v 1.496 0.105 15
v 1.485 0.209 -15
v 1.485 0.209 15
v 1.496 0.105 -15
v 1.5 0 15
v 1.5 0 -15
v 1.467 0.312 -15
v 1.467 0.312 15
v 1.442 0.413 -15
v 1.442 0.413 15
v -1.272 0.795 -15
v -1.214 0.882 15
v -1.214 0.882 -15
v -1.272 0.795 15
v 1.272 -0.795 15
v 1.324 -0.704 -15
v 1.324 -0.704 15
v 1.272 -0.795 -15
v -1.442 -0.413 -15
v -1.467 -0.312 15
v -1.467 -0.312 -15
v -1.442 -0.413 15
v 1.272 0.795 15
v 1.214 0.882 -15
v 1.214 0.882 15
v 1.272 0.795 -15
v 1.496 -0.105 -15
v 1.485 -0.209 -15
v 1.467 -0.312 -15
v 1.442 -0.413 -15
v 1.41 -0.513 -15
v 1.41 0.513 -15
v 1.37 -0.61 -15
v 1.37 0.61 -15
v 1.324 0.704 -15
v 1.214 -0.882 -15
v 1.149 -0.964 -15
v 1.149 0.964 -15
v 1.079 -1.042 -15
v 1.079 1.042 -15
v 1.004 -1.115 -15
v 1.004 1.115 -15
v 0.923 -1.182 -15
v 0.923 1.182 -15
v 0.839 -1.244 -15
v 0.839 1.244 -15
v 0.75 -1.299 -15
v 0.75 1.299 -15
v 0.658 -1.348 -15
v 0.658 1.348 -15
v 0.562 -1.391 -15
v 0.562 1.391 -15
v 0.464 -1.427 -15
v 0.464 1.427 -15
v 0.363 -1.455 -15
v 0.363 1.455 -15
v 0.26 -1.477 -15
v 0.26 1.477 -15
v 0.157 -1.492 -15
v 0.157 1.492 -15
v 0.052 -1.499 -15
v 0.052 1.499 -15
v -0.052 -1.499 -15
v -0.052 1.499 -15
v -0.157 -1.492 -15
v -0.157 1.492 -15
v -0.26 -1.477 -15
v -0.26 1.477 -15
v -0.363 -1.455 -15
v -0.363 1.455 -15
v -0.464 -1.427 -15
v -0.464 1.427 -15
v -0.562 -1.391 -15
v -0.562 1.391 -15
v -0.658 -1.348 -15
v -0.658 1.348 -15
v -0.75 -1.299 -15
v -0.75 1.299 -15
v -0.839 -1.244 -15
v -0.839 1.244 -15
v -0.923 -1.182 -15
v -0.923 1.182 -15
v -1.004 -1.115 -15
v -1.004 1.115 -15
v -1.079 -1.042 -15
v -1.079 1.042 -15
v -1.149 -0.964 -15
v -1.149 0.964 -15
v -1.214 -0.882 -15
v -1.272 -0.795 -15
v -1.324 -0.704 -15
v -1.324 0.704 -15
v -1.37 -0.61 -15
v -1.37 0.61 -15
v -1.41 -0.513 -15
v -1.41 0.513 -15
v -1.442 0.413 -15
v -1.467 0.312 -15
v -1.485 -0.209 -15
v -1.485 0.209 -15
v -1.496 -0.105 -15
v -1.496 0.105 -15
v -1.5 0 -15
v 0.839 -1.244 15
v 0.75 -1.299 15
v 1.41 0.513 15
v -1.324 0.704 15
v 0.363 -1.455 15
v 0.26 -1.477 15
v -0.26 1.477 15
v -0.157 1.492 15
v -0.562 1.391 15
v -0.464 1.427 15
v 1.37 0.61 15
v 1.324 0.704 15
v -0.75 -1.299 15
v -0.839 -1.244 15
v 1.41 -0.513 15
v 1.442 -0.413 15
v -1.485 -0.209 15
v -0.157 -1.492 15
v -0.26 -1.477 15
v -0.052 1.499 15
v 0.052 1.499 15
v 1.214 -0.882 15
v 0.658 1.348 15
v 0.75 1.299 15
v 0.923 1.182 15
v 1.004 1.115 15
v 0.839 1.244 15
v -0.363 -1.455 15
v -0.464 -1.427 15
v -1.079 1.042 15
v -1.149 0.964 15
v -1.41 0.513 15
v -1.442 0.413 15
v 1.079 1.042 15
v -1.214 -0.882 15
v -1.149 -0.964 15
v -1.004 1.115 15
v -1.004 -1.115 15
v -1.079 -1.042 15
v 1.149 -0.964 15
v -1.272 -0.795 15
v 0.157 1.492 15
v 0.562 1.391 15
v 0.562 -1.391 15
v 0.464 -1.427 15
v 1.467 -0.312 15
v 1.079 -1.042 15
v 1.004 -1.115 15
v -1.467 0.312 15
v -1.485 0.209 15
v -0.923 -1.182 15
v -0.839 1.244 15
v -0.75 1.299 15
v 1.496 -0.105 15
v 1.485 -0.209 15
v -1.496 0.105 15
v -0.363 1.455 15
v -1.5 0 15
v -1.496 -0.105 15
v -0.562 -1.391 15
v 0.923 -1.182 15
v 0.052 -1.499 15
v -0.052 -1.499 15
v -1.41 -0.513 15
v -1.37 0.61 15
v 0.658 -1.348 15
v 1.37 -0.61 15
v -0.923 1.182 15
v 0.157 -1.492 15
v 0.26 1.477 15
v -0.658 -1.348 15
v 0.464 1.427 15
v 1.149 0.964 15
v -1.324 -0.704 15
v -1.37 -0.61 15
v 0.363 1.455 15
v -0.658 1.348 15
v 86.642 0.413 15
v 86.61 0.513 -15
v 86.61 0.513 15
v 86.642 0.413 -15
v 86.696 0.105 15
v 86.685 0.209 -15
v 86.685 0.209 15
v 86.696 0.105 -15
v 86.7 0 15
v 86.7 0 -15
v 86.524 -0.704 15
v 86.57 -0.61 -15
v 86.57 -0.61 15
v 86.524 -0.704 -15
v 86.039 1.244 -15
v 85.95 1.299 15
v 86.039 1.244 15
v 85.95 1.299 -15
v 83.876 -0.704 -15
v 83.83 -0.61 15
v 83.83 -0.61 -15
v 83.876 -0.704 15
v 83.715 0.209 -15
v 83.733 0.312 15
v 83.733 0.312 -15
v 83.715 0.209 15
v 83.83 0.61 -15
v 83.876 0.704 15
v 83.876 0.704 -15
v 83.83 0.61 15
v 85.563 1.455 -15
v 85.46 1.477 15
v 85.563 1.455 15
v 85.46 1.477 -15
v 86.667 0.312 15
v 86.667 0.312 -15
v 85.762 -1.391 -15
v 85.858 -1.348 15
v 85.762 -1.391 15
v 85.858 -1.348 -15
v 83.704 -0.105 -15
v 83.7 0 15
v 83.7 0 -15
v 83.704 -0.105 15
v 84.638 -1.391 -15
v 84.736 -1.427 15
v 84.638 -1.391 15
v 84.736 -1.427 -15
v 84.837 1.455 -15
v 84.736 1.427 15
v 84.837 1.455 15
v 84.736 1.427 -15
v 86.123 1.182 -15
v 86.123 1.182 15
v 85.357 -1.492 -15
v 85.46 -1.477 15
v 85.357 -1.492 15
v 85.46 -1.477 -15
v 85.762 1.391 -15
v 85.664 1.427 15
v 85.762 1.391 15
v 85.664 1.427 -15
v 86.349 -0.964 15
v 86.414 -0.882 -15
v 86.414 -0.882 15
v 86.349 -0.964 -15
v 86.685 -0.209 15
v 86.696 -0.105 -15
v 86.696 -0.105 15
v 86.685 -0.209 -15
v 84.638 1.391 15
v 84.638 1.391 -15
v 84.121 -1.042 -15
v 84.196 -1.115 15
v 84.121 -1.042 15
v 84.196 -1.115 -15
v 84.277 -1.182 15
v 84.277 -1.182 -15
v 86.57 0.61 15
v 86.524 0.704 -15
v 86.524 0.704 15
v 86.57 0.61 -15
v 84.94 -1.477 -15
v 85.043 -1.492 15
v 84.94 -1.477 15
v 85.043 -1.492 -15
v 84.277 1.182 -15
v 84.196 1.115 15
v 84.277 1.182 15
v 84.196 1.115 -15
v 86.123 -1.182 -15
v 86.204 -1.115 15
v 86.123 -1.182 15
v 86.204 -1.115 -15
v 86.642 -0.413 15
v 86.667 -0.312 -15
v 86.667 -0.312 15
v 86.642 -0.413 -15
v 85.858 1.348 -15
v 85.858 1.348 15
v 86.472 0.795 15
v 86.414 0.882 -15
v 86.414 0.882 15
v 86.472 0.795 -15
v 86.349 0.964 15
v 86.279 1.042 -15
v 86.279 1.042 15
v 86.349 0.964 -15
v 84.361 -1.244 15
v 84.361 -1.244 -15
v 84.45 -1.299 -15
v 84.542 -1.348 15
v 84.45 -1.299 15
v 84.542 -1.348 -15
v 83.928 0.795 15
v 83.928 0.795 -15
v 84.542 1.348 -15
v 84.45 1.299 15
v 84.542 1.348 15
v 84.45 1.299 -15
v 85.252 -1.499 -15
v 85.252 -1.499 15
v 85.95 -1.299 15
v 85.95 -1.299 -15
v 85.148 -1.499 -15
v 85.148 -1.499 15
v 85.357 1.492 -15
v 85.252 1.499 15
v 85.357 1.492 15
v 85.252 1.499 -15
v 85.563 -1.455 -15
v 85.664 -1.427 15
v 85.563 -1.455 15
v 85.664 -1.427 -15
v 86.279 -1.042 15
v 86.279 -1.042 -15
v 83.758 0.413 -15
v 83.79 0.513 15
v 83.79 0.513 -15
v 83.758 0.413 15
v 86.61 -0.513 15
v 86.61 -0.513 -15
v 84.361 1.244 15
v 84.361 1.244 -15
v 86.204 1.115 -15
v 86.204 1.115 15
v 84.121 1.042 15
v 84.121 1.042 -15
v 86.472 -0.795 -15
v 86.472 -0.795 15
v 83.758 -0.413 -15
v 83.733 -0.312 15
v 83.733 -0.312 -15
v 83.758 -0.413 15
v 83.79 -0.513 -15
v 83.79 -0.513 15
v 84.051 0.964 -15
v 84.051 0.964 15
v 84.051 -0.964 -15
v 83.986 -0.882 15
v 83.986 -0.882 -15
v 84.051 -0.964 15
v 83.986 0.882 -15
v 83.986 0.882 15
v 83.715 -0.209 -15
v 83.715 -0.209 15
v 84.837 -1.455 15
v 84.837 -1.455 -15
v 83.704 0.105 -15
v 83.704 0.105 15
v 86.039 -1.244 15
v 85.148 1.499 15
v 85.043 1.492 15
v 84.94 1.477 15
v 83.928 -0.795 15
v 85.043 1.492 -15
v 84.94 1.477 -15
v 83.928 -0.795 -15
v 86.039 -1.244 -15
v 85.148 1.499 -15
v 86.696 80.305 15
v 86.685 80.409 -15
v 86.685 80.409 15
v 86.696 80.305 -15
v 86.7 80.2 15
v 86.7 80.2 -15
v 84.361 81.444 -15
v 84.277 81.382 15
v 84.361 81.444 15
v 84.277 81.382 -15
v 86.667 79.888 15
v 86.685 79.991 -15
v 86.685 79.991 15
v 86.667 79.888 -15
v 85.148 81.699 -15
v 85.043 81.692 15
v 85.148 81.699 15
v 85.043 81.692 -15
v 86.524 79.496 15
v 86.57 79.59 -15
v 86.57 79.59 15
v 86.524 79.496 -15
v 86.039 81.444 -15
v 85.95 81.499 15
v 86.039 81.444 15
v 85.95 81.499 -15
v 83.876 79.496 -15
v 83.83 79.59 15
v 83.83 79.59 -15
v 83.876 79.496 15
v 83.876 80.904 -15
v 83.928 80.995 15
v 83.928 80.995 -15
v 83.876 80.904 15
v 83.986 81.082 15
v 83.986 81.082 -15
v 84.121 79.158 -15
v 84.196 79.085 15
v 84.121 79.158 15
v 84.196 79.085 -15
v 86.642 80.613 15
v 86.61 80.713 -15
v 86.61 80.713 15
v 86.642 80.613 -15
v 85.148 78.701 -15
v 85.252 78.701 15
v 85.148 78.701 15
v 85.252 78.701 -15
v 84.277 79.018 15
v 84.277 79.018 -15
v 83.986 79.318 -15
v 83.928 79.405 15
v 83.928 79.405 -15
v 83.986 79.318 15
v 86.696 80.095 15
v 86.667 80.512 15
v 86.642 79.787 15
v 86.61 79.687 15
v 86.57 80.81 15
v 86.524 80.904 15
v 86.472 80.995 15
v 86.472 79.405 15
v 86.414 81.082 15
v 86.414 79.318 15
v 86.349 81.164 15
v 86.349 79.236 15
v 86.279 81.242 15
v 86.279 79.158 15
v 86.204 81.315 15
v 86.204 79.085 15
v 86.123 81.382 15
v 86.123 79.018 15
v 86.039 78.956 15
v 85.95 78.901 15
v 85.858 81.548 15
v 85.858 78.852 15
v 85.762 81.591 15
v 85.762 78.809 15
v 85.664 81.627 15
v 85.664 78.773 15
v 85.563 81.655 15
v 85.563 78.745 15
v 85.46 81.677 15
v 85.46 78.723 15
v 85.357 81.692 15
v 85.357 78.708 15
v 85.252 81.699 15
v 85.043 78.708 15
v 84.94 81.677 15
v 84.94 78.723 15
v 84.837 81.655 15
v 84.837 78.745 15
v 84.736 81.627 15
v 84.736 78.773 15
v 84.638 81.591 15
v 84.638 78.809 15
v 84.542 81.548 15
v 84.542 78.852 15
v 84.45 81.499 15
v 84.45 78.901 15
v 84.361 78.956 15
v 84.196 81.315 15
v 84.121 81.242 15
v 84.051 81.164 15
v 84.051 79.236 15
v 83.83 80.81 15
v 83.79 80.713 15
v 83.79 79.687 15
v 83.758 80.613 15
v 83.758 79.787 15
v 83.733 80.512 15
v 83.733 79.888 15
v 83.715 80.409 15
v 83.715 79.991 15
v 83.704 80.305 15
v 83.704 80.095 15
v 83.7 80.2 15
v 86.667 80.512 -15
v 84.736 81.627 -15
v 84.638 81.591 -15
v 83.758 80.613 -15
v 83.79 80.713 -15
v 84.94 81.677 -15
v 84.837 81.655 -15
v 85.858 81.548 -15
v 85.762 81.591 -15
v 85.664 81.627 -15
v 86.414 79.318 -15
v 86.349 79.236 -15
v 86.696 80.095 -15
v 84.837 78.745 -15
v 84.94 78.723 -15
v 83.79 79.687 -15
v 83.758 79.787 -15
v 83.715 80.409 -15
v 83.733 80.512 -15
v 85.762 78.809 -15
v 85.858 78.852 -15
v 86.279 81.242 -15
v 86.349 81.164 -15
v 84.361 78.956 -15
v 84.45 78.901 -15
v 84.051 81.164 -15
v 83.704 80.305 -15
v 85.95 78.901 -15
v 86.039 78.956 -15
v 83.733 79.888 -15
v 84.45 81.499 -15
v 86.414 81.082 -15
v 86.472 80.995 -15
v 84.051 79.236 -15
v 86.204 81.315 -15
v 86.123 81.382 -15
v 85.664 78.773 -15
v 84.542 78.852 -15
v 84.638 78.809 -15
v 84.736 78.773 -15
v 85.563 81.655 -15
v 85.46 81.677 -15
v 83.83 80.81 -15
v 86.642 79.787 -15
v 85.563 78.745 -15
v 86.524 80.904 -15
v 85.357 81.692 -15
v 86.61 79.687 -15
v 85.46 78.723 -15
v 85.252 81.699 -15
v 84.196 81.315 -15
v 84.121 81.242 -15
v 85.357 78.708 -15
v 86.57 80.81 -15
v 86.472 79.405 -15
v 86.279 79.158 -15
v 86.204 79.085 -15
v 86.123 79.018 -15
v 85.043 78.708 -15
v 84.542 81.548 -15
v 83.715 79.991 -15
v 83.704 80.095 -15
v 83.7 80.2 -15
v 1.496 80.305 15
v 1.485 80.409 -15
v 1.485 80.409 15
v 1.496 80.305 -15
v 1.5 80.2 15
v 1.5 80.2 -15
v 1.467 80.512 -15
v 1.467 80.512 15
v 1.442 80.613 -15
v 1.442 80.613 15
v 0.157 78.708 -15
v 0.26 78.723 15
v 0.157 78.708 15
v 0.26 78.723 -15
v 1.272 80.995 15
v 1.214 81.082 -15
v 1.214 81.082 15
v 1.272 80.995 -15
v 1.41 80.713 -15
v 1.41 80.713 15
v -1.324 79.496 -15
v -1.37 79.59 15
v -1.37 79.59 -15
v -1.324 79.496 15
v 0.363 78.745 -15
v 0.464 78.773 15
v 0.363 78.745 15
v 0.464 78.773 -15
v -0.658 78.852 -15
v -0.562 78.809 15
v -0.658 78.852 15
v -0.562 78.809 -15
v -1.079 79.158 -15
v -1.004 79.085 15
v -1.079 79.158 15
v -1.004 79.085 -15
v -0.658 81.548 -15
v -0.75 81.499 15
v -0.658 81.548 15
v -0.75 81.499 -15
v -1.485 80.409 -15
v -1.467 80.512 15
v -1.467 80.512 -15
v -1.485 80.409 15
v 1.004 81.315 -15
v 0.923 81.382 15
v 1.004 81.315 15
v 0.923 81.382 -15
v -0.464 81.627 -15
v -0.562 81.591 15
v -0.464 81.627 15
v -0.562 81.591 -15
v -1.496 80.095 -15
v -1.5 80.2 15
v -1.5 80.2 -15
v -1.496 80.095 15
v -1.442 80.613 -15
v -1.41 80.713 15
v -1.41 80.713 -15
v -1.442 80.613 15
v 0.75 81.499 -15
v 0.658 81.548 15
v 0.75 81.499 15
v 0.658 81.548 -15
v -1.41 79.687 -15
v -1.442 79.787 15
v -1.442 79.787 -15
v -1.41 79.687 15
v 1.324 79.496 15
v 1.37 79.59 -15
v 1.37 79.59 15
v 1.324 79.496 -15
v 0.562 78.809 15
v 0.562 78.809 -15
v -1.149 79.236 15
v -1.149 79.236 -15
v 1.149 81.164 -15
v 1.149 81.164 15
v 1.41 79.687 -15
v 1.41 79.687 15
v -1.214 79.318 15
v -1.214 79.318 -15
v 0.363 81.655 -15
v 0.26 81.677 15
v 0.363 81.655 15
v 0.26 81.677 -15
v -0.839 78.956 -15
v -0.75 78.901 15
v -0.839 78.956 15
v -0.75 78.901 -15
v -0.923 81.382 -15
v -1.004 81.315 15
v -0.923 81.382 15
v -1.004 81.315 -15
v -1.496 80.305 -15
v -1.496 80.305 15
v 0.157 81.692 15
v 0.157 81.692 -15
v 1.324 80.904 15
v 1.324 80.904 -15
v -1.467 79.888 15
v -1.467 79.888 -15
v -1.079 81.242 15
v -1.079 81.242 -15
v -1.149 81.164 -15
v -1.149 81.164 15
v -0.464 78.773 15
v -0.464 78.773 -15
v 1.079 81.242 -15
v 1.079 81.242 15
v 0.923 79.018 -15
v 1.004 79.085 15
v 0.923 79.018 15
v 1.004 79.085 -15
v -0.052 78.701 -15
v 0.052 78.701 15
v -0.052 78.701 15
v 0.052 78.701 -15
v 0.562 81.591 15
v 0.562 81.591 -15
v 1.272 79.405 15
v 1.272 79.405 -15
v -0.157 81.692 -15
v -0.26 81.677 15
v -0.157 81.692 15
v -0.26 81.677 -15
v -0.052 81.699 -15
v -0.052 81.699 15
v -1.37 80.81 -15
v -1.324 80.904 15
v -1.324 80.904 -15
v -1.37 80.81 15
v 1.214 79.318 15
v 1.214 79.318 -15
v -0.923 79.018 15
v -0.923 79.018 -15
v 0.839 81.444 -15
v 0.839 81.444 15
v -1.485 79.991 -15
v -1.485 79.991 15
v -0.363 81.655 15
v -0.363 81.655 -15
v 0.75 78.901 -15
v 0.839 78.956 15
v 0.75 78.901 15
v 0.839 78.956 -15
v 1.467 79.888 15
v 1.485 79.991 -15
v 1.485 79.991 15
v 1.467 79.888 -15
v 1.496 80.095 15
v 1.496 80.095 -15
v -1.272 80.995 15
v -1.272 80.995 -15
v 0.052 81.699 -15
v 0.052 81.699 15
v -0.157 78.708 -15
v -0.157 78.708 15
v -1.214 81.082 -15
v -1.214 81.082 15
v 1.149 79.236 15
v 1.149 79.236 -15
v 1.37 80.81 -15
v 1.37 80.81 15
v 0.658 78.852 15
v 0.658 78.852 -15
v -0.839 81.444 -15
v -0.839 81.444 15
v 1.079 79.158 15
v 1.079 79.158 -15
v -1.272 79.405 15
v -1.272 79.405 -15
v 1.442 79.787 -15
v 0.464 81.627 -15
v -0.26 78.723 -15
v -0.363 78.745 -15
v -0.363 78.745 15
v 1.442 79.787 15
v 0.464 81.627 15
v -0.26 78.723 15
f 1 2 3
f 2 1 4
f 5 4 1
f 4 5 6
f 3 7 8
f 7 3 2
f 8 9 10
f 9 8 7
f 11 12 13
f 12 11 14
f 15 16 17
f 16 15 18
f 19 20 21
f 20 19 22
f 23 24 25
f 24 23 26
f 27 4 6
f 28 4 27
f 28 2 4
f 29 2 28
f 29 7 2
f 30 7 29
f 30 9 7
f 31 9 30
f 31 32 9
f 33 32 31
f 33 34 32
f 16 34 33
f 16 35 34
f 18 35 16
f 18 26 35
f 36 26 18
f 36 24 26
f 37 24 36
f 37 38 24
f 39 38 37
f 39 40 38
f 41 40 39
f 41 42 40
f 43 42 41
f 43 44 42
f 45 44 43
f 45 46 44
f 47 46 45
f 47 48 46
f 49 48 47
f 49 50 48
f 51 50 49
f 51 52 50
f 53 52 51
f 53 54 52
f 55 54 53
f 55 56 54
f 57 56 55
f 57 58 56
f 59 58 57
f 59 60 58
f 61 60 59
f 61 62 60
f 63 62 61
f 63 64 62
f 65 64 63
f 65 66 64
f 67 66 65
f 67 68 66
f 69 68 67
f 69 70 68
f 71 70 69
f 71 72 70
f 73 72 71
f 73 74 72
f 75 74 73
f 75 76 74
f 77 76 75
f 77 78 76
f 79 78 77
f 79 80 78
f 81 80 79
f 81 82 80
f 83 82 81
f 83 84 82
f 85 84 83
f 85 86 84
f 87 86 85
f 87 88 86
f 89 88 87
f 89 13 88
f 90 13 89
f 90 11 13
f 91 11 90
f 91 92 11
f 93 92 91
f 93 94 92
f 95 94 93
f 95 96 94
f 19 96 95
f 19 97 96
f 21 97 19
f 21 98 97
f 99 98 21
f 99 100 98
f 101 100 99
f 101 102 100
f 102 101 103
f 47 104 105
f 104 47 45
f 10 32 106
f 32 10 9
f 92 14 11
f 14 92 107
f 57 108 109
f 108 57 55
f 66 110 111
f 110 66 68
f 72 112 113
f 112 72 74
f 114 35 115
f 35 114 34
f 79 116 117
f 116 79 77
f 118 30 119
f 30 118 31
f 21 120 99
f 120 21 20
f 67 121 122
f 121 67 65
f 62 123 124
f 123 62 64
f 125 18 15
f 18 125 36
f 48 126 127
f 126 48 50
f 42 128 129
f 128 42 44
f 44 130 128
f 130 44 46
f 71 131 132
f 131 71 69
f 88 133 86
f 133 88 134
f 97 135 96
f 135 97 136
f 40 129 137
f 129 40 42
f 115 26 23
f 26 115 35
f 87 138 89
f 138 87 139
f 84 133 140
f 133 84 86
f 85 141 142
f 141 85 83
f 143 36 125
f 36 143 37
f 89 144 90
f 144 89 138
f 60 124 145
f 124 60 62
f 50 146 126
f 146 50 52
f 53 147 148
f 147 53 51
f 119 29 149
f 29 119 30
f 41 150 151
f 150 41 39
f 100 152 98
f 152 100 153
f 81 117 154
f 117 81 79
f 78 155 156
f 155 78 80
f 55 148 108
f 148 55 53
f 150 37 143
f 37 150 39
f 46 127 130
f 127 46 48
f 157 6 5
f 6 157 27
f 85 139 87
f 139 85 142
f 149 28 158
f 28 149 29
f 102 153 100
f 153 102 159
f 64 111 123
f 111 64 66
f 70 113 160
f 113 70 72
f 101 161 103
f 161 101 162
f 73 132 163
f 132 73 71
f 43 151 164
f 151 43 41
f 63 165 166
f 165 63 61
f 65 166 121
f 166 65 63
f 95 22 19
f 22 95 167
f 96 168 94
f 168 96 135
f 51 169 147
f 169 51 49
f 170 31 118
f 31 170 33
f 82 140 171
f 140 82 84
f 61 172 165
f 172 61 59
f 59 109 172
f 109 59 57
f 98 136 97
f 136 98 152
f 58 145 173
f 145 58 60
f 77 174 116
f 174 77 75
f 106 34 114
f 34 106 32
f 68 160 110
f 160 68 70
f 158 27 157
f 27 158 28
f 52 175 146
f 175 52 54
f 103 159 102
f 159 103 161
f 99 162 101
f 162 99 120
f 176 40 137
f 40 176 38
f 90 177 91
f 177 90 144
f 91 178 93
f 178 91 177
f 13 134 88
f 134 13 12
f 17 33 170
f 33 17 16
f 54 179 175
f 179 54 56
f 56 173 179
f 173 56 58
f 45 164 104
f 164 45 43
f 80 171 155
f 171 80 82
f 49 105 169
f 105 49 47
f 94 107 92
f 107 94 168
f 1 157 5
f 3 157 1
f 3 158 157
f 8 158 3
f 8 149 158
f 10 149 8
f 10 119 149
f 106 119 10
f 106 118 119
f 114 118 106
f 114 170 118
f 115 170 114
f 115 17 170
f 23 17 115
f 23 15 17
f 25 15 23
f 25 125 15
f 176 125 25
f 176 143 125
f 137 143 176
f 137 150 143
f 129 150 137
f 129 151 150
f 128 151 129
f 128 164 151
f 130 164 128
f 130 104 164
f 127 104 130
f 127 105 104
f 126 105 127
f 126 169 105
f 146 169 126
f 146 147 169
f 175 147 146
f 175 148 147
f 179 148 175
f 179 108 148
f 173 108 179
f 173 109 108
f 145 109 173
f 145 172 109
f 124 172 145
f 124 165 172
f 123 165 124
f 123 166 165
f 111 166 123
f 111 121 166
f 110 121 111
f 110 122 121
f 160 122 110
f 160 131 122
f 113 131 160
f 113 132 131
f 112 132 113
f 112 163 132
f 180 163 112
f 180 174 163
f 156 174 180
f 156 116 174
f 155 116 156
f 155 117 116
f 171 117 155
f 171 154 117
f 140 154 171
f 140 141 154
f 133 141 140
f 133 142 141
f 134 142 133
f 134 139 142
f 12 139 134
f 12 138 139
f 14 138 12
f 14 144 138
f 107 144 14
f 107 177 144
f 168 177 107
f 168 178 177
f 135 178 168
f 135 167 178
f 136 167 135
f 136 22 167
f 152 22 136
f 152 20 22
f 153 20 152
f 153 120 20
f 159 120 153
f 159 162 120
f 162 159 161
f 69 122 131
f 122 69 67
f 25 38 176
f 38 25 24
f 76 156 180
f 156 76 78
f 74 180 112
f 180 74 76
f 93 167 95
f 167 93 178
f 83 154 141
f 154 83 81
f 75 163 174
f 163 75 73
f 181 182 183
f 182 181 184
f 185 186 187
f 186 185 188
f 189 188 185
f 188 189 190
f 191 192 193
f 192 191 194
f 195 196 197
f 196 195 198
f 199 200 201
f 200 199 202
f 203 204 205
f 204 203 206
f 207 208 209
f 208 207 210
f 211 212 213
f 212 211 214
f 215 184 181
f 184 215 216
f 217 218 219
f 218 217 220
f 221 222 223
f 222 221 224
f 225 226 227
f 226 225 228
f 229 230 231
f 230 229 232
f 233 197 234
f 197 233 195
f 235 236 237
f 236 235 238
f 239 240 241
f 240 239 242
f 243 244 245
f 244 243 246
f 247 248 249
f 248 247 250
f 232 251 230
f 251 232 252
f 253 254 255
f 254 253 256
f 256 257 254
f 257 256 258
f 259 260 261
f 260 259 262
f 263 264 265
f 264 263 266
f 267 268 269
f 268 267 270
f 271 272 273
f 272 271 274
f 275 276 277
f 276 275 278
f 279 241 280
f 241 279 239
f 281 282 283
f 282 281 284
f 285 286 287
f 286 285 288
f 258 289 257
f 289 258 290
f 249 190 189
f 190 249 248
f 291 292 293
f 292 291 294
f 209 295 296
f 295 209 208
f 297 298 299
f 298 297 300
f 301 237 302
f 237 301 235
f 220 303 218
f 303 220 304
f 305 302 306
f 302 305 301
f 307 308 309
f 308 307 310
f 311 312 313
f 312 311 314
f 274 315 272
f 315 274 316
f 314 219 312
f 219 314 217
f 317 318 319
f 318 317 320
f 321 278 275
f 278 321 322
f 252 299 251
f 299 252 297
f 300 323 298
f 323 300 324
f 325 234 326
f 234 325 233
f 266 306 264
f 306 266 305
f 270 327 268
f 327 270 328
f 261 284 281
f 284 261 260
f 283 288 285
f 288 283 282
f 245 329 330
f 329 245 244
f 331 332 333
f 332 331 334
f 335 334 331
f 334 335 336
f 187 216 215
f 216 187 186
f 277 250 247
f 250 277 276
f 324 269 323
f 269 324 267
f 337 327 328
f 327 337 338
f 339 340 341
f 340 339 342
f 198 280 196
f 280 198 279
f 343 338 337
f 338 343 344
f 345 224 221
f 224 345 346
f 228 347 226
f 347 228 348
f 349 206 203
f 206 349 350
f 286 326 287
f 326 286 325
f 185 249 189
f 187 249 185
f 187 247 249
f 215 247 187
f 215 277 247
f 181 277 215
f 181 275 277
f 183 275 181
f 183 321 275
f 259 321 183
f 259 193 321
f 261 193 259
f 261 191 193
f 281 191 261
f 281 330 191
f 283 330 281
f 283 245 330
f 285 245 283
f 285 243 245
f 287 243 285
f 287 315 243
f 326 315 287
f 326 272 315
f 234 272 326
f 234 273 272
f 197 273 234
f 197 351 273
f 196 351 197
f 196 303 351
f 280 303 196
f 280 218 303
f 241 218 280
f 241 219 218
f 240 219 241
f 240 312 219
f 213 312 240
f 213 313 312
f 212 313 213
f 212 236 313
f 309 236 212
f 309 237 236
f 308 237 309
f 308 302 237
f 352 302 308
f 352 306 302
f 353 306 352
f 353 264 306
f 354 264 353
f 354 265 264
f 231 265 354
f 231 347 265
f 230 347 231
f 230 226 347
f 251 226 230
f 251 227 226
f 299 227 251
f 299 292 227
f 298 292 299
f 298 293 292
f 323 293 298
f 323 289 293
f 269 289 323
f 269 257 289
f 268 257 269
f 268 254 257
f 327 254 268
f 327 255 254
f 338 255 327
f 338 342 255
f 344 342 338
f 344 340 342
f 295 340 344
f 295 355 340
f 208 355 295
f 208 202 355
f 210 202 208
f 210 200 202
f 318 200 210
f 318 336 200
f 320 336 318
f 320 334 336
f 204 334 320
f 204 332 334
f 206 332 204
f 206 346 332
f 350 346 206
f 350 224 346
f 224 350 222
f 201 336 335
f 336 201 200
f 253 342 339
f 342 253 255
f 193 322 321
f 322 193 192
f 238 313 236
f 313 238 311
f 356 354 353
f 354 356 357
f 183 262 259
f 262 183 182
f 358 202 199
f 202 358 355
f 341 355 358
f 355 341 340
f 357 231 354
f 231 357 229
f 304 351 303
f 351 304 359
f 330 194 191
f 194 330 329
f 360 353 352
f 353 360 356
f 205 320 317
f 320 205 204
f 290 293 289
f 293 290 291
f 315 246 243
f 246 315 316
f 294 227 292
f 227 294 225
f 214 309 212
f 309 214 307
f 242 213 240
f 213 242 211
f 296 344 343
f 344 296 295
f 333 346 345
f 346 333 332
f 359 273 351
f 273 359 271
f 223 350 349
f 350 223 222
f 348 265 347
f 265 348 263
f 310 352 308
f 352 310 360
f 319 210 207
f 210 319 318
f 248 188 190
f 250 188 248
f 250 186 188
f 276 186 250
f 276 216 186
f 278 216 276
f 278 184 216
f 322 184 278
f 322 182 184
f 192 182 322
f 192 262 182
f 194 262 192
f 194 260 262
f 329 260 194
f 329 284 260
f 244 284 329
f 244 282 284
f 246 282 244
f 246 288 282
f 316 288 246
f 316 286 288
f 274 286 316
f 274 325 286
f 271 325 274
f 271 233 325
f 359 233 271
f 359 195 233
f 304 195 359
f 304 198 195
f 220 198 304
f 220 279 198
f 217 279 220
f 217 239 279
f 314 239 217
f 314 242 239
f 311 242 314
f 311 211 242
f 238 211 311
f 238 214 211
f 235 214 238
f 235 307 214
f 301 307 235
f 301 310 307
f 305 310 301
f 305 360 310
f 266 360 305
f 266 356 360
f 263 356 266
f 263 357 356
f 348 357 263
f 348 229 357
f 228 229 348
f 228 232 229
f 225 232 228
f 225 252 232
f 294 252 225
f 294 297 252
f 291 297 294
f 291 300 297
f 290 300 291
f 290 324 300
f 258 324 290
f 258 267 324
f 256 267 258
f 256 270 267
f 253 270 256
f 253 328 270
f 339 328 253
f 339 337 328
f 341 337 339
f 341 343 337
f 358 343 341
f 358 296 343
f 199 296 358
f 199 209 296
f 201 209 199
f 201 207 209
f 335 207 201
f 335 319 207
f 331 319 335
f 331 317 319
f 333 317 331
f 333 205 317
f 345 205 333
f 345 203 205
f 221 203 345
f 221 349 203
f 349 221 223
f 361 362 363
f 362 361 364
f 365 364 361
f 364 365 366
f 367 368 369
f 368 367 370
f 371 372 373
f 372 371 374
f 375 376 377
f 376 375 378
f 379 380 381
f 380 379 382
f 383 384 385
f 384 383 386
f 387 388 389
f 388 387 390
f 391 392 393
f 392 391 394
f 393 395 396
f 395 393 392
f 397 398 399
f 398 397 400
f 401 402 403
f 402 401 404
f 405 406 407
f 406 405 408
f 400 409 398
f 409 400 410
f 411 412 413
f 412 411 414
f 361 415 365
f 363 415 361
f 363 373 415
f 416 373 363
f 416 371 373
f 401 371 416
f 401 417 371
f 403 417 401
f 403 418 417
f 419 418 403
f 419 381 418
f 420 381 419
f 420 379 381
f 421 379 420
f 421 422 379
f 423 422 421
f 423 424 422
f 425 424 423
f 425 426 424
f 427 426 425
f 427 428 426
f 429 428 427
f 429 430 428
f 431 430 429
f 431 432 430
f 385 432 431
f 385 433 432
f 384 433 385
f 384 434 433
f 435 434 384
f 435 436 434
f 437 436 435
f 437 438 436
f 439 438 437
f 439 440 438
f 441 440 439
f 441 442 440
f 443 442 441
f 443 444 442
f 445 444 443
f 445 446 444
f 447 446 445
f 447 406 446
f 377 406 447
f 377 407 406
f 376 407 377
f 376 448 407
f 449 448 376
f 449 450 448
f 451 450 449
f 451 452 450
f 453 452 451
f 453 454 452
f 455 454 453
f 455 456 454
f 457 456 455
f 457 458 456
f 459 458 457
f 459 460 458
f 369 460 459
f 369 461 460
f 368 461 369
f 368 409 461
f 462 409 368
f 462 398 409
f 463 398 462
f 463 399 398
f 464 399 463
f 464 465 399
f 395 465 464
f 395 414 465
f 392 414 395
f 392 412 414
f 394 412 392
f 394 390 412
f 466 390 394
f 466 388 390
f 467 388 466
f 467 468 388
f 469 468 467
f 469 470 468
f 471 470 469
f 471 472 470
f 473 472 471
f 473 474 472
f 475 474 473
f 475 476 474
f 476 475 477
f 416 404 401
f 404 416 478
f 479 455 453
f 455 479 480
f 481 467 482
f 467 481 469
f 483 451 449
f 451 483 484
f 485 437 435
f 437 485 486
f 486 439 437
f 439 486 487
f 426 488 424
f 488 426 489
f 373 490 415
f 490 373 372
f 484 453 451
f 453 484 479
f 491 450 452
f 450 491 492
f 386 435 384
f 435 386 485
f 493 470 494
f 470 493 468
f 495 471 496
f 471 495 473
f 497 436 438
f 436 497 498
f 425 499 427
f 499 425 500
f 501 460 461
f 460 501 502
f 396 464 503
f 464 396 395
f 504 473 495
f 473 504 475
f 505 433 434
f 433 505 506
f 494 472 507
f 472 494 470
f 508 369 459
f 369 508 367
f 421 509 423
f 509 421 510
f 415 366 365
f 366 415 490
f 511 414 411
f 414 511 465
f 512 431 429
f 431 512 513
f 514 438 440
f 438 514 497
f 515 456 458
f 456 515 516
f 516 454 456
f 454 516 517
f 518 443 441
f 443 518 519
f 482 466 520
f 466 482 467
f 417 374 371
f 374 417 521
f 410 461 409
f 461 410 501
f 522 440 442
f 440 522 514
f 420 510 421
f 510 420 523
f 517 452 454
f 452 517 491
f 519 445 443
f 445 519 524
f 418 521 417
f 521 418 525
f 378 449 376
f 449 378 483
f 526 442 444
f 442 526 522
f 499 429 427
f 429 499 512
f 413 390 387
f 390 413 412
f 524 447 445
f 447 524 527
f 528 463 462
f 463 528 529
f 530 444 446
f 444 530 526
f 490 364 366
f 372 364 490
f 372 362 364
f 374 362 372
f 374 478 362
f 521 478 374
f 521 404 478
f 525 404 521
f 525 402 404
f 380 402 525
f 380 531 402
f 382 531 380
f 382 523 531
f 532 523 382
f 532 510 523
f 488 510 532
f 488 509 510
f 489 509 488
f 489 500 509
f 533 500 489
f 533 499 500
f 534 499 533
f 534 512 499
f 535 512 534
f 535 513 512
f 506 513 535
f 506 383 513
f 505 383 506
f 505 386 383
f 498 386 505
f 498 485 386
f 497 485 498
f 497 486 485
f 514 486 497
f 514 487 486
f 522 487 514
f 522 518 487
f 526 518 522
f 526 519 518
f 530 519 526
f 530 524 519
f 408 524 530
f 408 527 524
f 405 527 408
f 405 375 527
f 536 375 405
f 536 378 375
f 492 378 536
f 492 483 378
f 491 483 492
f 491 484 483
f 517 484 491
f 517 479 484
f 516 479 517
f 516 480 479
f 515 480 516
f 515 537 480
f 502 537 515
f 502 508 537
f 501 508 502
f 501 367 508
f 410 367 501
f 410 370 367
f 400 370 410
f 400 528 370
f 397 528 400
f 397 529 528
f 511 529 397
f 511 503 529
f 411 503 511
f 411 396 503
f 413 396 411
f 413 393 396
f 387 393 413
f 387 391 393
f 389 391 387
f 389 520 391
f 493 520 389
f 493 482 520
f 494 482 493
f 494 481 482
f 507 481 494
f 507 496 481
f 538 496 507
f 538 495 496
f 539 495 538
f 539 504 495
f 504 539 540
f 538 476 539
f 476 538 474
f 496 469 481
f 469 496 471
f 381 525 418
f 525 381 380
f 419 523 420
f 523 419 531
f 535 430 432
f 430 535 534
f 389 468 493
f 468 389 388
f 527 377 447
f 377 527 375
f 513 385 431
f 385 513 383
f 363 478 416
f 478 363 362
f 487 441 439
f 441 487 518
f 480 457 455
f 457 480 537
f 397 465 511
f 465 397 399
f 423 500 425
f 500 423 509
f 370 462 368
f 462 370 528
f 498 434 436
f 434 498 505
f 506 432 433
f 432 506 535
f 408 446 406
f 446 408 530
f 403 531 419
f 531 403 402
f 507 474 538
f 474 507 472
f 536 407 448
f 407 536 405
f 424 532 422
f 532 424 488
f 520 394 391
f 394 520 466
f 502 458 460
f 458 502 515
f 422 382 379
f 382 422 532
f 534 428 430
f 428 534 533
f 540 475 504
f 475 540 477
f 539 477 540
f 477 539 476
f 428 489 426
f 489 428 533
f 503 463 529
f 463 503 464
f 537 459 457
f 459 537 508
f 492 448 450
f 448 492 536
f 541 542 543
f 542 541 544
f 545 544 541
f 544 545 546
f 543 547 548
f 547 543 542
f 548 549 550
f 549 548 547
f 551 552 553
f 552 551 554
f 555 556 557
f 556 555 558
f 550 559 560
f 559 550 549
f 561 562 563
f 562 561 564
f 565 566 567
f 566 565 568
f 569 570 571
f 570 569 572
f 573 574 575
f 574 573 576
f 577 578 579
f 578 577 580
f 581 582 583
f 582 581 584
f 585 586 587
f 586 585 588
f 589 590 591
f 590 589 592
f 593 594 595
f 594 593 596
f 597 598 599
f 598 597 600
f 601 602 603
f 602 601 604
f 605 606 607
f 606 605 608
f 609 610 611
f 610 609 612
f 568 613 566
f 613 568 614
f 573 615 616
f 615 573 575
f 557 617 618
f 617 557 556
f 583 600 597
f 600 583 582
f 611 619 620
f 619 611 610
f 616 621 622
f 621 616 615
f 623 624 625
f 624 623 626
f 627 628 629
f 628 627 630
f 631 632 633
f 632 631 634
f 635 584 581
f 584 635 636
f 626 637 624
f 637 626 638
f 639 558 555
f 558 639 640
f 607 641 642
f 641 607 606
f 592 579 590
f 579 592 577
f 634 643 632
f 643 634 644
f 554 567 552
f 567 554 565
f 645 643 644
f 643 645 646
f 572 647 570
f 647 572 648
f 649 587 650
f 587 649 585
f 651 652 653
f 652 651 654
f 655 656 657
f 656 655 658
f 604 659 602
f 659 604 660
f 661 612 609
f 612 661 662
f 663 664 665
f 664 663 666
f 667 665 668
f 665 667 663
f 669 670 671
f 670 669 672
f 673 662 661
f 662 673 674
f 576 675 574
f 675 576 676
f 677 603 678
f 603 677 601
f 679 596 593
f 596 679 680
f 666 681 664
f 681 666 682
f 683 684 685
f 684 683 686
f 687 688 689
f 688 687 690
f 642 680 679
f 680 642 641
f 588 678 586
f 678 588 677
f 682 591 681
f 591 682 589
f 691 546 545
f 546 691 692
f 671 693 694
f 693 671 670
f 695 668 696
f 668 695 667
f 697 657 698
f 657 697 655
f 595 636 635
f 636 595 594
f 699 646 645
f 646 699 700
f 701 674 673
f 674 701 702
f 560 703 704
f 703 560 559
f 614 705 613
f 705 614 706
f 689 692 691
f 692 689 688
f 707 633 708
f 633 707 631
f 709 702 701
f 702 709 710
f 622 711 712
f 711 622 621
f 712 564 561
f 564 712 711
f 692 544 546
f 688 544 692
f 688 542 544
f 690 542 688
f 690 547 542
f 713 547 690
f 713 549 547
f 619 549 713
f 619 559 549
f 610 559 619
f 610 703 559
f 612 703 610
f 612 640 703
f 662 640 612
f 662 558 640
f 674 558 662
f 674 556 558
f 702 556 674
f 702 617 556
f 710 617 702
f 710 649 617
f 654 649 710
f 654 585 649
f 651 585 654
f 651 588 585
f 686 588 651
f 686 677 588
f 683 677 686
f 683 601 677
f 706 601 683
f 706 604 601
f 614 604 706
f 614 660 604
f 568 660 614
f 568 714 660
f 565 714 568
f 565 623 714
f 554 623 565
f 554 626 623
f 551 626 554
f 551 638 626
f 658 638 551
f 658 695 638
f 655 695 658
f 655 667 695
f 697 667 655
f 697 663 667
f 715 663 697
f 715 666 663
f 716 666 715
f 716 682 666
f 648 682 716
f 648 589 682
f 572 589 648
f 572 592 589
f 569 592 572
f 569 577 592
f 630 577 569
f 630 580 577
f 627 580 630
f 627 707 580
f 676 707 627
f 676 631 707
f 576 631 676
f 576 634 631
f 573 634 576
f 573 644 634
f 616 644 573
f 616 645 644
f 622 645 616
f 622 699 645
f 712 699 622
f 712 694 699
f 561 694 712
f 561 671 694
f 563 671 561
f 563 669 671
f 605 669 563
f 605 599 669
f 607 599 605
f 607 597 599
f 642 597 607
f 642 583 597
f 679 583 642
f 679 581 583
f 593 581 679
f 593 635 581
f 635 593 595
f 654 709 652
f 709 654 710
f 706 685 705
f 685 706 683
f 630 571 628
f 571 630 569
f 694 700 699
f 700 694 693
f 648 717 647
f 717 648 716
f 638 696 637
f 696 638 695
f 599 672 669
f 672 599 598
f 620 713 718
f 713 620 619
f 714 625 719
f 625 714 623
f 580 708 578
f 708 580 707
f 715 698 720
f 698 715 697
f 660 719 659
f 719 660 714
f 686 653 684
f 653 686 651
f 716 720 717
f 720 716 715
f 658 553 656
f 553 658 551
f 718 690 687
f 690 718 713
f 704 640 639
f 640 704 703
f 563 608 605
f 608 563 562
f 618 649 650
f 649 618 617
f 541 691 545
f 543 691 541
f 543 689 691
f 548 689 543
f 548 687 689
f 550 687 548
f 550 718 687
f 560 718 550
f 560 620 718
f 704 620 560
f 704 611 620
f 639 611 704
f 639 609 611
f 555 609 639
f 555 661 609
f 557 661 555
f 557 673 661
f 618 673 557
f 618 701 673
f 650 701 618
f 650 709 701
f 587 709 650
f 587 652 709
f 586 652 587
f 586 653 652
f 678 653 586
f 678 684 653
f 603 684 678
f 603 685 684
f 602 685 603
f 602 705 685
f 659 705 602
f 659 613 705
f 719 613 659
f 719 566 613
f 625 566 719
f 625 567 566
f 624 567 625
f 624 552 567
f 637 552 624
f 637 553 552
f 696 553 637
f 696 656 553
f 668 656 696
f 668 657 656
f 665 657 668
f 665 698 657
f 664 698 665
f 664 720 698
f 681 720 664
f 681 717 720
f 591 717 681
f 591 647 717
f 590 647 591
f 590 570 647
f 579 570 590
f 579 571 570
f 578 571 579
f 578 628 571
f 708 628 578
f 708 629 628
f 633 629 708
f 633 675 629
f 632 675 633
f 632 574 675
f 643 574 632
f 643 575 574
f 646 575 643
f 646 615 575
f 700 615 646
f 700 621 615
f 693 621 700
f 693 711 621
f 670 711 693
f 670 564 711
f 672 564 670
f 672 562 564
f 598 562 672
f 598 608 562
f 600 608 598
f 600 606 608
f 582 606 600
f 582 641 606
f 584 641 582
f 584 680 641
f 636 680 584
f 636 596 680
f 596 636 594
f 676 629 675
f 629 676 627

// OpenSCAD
$fn=90;
//import("esp_car_pcb.stl");

//pcb_holes();
car_holder(); // connect tocar


module pcb_holes() {
    rotate([0,0,0]) pins();
}



module pins() {
    
    translate([4-0.5,-70+2,0]) cyl2();
    translate([7.3,-5+2,0]) cyl2();
    translate([63.2,-17+0.2,0]) cyl2();
    translate([78,-75.9,0]) cyl2();
    
} // of pcb_holes()



module car_holder() {
    dx = 85.2;
    dy = 80.2;
    color("cyan") translate([0,0,0]) cyl3();
    color("cyan") translate([dx,0,0]) cyl3();
    color("cyan") translate([dx,dy,0]) cyl3();
    color("cyan") translate([0,dy,0]) cyl3();

} // of car_holder()




module cyl2() {
    color("red") cylinder(d=2,h=30,center=true);
} 

module cyl3() {
    color("red") cylinder(d=3,h=30,center=true);
} 
